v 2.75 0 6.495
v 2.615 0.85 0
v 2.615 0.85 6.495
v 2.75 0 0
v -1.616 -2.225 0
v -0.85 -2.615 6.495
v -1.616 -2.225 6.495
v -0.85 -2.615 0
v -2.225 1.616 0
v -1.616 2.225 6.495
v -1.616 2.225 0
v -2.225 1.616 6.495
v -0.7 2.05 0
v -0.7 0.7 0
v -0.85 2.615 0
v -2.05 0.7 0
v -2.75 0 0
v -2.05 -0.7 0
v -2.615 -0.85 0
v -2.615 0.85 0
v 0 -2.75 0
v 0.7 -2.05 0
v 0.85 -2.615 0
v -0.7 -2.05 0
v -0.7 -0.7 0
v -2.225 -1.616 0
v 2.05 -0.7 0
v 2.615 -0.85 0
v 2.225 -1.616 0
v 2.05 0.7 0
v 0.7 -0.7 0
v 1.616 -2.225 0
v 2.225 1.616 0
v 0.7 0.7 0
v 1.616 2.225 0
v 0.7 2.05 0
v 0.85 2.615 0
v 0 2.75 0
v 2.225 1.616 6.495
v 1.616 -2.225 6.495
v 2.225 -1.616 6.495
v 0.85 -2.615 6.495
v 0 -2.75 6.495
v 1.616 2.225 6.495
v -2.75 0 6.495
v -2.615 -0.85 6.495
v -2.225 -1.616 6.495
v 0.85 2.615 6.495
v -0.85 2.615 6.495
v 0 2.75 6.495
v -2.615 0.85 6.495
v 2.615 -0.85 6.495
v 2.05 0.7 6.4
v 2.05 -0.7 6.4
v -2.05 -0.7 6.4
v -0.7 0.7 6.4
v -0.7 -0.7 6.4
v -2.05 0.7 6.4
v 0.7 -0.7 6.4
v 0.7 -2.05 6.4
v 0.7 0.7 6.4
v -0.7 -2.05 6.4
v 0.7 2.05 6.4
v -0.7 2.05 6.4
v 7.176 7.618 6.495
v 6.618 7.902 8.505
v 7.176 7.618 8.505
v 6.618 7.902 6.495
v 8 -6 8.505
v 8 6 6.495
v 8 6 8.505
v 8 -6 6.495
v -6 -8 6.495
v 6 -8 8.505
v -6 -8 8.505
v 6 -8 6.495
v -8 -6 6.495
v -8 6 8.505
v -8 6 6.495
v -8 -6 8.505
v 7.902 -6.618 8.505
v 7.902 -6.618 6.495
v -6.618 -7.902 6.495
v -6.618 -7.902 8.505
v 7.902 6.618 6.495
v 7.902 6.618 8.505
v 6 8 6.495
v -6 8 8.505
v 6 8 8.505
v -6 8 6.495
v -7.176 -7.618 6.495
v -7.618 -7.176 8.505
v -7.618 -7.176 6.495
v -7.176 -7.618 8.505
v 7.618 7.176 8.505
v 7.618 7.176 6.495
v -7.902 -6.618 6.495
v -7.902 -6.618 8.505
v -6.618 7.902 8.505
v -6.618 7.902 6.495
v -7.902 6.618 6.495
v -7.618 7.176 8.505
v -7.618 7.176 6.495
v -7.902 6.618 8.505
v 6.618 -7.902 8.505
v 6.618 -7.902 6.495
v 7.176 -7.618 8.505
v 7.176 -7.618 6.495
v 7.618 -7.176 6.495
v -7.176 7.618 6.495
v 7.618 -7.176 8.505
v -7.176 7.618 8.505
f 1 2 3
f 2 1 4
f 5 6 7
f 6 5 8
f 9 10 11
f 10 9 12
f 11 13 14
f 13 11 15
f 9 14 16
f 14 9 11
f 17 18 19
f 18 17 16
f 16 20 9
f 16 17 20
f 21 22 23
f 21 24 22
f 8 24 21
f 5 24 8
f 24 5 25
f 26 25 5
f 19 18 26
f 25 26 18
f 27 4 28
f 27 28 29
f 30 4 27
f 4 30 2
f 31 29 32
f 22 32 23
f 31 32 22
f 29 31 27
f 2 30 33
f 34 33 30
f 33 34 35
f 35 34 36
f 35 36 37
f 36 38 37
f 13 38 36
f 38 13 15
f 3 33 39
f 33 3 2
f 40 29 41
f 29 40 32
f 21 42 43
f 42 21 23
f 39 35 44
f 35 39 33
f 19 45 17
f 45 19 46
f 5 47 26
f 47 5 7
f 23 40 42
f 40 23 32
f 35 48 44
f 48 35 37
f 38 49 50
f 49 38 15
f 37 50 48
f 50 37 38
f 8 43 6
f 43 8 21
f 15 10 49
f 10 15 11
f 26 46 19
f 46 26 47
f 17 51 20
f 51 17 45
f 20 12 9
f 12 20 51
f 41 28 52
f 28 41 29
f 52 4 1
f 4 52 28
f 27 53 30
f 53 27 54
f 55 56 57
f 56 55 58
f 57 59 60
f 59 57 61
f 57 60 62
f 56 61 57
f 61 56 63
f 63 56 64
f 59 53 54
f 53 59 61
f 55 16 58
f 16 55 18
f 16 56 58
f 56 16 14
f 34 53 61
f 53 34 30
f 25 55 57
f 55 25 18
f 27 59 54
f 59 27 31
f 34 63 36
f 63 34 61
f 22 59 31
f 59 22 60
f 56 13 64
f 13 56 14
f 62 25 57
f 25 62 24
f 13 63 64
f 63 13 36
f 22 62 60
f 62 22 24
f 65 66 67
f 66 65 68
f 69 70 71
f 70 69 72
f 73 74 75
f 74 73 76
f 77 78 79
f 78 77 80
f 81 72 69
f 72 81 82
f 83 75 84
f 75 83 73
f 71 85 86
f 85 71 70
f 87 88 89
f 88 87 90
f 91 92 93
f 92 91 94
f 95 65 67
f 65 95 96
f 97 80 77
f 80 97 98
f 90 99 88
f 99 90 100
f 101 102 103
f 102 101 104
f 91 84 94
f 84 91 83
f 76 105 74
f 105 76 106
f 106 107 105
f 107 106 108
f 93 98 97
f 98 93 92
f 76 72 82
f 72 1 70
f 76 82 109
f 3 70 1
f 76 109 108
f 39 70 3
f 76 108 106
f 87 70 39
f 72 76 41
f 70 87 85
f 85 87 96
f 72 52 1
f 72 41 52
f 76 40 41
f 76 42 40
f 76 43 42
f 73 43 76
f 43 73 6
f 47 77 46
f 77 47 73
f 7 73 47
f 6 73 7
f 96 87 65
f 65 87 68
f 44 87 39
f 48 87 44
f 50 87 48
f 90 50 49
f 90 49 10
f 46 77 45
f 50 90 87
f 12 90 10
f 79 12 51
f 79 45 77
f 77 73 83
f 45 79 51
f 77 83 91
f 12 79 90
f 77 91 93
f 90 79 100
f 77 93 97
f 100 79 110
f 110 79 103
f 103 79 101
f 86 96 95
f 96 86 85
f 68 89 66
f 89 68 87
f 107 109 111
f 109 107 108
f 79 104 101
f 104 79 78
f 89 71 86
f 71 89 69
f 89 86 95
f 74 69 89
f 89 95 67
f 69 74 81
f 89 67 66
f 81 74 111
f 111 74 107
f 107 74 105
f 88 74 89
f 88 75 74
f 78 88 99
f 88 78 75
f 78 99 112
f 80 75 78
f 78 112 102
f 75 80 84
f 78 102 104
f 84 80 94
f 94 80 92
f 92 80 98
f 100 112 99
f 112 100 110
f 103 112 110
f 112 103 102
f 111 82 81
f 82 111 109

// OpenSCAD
stem_height = 6.5;
top_side = 16;
cap_thickness = 2;
side_thickness = 1;
corner_radius = 2;
stem_diameter=5.5;

// I'm printing in my local library and don't have access to printer settings,
// So I have modified slots a little bit to make them tighter.
// Original dimensions were [4.2,1.5,40]
slot_length = 4.1;
slot_width = 1.4;
slots = [[slot_length,slot_width, stem_height], [slot_width,slot_length, stem_height]];

// cube([top_side, top_side, 15], center=true);
union() {
    minkowski() {
        translate([0, 0, stem_height])
            cube([top_side-corner_radius*2, top_side-corner_radius*2, 0.01], center=true);
        // sphere(r=corner_radius, $fn=20);
        cylinder(h=cap_thickness, r=corner_radius, $fn=20);
    }
    // TODO this should be a part of cap
    /*translate([top_side/2-0.5, 0, stem_height-1.5]) cube([side_thickness, top_side-4, stem_height/2], center=true);*/

    // stem height check
    // color("red") translate([8, 8, 0]) cylinder(h=stem_height, r=corner_radius, $fn=20);


    // stem
    difference() {
        cylinder(stem_height, d=stem_diameter, $fn=20);
        translate([0,0, stem_height/2-0.1]) cube(slots[0], center=true);
        translate([0,0, stem_height/2-0.1]) cube(slots[1], center=true);
    }
}
